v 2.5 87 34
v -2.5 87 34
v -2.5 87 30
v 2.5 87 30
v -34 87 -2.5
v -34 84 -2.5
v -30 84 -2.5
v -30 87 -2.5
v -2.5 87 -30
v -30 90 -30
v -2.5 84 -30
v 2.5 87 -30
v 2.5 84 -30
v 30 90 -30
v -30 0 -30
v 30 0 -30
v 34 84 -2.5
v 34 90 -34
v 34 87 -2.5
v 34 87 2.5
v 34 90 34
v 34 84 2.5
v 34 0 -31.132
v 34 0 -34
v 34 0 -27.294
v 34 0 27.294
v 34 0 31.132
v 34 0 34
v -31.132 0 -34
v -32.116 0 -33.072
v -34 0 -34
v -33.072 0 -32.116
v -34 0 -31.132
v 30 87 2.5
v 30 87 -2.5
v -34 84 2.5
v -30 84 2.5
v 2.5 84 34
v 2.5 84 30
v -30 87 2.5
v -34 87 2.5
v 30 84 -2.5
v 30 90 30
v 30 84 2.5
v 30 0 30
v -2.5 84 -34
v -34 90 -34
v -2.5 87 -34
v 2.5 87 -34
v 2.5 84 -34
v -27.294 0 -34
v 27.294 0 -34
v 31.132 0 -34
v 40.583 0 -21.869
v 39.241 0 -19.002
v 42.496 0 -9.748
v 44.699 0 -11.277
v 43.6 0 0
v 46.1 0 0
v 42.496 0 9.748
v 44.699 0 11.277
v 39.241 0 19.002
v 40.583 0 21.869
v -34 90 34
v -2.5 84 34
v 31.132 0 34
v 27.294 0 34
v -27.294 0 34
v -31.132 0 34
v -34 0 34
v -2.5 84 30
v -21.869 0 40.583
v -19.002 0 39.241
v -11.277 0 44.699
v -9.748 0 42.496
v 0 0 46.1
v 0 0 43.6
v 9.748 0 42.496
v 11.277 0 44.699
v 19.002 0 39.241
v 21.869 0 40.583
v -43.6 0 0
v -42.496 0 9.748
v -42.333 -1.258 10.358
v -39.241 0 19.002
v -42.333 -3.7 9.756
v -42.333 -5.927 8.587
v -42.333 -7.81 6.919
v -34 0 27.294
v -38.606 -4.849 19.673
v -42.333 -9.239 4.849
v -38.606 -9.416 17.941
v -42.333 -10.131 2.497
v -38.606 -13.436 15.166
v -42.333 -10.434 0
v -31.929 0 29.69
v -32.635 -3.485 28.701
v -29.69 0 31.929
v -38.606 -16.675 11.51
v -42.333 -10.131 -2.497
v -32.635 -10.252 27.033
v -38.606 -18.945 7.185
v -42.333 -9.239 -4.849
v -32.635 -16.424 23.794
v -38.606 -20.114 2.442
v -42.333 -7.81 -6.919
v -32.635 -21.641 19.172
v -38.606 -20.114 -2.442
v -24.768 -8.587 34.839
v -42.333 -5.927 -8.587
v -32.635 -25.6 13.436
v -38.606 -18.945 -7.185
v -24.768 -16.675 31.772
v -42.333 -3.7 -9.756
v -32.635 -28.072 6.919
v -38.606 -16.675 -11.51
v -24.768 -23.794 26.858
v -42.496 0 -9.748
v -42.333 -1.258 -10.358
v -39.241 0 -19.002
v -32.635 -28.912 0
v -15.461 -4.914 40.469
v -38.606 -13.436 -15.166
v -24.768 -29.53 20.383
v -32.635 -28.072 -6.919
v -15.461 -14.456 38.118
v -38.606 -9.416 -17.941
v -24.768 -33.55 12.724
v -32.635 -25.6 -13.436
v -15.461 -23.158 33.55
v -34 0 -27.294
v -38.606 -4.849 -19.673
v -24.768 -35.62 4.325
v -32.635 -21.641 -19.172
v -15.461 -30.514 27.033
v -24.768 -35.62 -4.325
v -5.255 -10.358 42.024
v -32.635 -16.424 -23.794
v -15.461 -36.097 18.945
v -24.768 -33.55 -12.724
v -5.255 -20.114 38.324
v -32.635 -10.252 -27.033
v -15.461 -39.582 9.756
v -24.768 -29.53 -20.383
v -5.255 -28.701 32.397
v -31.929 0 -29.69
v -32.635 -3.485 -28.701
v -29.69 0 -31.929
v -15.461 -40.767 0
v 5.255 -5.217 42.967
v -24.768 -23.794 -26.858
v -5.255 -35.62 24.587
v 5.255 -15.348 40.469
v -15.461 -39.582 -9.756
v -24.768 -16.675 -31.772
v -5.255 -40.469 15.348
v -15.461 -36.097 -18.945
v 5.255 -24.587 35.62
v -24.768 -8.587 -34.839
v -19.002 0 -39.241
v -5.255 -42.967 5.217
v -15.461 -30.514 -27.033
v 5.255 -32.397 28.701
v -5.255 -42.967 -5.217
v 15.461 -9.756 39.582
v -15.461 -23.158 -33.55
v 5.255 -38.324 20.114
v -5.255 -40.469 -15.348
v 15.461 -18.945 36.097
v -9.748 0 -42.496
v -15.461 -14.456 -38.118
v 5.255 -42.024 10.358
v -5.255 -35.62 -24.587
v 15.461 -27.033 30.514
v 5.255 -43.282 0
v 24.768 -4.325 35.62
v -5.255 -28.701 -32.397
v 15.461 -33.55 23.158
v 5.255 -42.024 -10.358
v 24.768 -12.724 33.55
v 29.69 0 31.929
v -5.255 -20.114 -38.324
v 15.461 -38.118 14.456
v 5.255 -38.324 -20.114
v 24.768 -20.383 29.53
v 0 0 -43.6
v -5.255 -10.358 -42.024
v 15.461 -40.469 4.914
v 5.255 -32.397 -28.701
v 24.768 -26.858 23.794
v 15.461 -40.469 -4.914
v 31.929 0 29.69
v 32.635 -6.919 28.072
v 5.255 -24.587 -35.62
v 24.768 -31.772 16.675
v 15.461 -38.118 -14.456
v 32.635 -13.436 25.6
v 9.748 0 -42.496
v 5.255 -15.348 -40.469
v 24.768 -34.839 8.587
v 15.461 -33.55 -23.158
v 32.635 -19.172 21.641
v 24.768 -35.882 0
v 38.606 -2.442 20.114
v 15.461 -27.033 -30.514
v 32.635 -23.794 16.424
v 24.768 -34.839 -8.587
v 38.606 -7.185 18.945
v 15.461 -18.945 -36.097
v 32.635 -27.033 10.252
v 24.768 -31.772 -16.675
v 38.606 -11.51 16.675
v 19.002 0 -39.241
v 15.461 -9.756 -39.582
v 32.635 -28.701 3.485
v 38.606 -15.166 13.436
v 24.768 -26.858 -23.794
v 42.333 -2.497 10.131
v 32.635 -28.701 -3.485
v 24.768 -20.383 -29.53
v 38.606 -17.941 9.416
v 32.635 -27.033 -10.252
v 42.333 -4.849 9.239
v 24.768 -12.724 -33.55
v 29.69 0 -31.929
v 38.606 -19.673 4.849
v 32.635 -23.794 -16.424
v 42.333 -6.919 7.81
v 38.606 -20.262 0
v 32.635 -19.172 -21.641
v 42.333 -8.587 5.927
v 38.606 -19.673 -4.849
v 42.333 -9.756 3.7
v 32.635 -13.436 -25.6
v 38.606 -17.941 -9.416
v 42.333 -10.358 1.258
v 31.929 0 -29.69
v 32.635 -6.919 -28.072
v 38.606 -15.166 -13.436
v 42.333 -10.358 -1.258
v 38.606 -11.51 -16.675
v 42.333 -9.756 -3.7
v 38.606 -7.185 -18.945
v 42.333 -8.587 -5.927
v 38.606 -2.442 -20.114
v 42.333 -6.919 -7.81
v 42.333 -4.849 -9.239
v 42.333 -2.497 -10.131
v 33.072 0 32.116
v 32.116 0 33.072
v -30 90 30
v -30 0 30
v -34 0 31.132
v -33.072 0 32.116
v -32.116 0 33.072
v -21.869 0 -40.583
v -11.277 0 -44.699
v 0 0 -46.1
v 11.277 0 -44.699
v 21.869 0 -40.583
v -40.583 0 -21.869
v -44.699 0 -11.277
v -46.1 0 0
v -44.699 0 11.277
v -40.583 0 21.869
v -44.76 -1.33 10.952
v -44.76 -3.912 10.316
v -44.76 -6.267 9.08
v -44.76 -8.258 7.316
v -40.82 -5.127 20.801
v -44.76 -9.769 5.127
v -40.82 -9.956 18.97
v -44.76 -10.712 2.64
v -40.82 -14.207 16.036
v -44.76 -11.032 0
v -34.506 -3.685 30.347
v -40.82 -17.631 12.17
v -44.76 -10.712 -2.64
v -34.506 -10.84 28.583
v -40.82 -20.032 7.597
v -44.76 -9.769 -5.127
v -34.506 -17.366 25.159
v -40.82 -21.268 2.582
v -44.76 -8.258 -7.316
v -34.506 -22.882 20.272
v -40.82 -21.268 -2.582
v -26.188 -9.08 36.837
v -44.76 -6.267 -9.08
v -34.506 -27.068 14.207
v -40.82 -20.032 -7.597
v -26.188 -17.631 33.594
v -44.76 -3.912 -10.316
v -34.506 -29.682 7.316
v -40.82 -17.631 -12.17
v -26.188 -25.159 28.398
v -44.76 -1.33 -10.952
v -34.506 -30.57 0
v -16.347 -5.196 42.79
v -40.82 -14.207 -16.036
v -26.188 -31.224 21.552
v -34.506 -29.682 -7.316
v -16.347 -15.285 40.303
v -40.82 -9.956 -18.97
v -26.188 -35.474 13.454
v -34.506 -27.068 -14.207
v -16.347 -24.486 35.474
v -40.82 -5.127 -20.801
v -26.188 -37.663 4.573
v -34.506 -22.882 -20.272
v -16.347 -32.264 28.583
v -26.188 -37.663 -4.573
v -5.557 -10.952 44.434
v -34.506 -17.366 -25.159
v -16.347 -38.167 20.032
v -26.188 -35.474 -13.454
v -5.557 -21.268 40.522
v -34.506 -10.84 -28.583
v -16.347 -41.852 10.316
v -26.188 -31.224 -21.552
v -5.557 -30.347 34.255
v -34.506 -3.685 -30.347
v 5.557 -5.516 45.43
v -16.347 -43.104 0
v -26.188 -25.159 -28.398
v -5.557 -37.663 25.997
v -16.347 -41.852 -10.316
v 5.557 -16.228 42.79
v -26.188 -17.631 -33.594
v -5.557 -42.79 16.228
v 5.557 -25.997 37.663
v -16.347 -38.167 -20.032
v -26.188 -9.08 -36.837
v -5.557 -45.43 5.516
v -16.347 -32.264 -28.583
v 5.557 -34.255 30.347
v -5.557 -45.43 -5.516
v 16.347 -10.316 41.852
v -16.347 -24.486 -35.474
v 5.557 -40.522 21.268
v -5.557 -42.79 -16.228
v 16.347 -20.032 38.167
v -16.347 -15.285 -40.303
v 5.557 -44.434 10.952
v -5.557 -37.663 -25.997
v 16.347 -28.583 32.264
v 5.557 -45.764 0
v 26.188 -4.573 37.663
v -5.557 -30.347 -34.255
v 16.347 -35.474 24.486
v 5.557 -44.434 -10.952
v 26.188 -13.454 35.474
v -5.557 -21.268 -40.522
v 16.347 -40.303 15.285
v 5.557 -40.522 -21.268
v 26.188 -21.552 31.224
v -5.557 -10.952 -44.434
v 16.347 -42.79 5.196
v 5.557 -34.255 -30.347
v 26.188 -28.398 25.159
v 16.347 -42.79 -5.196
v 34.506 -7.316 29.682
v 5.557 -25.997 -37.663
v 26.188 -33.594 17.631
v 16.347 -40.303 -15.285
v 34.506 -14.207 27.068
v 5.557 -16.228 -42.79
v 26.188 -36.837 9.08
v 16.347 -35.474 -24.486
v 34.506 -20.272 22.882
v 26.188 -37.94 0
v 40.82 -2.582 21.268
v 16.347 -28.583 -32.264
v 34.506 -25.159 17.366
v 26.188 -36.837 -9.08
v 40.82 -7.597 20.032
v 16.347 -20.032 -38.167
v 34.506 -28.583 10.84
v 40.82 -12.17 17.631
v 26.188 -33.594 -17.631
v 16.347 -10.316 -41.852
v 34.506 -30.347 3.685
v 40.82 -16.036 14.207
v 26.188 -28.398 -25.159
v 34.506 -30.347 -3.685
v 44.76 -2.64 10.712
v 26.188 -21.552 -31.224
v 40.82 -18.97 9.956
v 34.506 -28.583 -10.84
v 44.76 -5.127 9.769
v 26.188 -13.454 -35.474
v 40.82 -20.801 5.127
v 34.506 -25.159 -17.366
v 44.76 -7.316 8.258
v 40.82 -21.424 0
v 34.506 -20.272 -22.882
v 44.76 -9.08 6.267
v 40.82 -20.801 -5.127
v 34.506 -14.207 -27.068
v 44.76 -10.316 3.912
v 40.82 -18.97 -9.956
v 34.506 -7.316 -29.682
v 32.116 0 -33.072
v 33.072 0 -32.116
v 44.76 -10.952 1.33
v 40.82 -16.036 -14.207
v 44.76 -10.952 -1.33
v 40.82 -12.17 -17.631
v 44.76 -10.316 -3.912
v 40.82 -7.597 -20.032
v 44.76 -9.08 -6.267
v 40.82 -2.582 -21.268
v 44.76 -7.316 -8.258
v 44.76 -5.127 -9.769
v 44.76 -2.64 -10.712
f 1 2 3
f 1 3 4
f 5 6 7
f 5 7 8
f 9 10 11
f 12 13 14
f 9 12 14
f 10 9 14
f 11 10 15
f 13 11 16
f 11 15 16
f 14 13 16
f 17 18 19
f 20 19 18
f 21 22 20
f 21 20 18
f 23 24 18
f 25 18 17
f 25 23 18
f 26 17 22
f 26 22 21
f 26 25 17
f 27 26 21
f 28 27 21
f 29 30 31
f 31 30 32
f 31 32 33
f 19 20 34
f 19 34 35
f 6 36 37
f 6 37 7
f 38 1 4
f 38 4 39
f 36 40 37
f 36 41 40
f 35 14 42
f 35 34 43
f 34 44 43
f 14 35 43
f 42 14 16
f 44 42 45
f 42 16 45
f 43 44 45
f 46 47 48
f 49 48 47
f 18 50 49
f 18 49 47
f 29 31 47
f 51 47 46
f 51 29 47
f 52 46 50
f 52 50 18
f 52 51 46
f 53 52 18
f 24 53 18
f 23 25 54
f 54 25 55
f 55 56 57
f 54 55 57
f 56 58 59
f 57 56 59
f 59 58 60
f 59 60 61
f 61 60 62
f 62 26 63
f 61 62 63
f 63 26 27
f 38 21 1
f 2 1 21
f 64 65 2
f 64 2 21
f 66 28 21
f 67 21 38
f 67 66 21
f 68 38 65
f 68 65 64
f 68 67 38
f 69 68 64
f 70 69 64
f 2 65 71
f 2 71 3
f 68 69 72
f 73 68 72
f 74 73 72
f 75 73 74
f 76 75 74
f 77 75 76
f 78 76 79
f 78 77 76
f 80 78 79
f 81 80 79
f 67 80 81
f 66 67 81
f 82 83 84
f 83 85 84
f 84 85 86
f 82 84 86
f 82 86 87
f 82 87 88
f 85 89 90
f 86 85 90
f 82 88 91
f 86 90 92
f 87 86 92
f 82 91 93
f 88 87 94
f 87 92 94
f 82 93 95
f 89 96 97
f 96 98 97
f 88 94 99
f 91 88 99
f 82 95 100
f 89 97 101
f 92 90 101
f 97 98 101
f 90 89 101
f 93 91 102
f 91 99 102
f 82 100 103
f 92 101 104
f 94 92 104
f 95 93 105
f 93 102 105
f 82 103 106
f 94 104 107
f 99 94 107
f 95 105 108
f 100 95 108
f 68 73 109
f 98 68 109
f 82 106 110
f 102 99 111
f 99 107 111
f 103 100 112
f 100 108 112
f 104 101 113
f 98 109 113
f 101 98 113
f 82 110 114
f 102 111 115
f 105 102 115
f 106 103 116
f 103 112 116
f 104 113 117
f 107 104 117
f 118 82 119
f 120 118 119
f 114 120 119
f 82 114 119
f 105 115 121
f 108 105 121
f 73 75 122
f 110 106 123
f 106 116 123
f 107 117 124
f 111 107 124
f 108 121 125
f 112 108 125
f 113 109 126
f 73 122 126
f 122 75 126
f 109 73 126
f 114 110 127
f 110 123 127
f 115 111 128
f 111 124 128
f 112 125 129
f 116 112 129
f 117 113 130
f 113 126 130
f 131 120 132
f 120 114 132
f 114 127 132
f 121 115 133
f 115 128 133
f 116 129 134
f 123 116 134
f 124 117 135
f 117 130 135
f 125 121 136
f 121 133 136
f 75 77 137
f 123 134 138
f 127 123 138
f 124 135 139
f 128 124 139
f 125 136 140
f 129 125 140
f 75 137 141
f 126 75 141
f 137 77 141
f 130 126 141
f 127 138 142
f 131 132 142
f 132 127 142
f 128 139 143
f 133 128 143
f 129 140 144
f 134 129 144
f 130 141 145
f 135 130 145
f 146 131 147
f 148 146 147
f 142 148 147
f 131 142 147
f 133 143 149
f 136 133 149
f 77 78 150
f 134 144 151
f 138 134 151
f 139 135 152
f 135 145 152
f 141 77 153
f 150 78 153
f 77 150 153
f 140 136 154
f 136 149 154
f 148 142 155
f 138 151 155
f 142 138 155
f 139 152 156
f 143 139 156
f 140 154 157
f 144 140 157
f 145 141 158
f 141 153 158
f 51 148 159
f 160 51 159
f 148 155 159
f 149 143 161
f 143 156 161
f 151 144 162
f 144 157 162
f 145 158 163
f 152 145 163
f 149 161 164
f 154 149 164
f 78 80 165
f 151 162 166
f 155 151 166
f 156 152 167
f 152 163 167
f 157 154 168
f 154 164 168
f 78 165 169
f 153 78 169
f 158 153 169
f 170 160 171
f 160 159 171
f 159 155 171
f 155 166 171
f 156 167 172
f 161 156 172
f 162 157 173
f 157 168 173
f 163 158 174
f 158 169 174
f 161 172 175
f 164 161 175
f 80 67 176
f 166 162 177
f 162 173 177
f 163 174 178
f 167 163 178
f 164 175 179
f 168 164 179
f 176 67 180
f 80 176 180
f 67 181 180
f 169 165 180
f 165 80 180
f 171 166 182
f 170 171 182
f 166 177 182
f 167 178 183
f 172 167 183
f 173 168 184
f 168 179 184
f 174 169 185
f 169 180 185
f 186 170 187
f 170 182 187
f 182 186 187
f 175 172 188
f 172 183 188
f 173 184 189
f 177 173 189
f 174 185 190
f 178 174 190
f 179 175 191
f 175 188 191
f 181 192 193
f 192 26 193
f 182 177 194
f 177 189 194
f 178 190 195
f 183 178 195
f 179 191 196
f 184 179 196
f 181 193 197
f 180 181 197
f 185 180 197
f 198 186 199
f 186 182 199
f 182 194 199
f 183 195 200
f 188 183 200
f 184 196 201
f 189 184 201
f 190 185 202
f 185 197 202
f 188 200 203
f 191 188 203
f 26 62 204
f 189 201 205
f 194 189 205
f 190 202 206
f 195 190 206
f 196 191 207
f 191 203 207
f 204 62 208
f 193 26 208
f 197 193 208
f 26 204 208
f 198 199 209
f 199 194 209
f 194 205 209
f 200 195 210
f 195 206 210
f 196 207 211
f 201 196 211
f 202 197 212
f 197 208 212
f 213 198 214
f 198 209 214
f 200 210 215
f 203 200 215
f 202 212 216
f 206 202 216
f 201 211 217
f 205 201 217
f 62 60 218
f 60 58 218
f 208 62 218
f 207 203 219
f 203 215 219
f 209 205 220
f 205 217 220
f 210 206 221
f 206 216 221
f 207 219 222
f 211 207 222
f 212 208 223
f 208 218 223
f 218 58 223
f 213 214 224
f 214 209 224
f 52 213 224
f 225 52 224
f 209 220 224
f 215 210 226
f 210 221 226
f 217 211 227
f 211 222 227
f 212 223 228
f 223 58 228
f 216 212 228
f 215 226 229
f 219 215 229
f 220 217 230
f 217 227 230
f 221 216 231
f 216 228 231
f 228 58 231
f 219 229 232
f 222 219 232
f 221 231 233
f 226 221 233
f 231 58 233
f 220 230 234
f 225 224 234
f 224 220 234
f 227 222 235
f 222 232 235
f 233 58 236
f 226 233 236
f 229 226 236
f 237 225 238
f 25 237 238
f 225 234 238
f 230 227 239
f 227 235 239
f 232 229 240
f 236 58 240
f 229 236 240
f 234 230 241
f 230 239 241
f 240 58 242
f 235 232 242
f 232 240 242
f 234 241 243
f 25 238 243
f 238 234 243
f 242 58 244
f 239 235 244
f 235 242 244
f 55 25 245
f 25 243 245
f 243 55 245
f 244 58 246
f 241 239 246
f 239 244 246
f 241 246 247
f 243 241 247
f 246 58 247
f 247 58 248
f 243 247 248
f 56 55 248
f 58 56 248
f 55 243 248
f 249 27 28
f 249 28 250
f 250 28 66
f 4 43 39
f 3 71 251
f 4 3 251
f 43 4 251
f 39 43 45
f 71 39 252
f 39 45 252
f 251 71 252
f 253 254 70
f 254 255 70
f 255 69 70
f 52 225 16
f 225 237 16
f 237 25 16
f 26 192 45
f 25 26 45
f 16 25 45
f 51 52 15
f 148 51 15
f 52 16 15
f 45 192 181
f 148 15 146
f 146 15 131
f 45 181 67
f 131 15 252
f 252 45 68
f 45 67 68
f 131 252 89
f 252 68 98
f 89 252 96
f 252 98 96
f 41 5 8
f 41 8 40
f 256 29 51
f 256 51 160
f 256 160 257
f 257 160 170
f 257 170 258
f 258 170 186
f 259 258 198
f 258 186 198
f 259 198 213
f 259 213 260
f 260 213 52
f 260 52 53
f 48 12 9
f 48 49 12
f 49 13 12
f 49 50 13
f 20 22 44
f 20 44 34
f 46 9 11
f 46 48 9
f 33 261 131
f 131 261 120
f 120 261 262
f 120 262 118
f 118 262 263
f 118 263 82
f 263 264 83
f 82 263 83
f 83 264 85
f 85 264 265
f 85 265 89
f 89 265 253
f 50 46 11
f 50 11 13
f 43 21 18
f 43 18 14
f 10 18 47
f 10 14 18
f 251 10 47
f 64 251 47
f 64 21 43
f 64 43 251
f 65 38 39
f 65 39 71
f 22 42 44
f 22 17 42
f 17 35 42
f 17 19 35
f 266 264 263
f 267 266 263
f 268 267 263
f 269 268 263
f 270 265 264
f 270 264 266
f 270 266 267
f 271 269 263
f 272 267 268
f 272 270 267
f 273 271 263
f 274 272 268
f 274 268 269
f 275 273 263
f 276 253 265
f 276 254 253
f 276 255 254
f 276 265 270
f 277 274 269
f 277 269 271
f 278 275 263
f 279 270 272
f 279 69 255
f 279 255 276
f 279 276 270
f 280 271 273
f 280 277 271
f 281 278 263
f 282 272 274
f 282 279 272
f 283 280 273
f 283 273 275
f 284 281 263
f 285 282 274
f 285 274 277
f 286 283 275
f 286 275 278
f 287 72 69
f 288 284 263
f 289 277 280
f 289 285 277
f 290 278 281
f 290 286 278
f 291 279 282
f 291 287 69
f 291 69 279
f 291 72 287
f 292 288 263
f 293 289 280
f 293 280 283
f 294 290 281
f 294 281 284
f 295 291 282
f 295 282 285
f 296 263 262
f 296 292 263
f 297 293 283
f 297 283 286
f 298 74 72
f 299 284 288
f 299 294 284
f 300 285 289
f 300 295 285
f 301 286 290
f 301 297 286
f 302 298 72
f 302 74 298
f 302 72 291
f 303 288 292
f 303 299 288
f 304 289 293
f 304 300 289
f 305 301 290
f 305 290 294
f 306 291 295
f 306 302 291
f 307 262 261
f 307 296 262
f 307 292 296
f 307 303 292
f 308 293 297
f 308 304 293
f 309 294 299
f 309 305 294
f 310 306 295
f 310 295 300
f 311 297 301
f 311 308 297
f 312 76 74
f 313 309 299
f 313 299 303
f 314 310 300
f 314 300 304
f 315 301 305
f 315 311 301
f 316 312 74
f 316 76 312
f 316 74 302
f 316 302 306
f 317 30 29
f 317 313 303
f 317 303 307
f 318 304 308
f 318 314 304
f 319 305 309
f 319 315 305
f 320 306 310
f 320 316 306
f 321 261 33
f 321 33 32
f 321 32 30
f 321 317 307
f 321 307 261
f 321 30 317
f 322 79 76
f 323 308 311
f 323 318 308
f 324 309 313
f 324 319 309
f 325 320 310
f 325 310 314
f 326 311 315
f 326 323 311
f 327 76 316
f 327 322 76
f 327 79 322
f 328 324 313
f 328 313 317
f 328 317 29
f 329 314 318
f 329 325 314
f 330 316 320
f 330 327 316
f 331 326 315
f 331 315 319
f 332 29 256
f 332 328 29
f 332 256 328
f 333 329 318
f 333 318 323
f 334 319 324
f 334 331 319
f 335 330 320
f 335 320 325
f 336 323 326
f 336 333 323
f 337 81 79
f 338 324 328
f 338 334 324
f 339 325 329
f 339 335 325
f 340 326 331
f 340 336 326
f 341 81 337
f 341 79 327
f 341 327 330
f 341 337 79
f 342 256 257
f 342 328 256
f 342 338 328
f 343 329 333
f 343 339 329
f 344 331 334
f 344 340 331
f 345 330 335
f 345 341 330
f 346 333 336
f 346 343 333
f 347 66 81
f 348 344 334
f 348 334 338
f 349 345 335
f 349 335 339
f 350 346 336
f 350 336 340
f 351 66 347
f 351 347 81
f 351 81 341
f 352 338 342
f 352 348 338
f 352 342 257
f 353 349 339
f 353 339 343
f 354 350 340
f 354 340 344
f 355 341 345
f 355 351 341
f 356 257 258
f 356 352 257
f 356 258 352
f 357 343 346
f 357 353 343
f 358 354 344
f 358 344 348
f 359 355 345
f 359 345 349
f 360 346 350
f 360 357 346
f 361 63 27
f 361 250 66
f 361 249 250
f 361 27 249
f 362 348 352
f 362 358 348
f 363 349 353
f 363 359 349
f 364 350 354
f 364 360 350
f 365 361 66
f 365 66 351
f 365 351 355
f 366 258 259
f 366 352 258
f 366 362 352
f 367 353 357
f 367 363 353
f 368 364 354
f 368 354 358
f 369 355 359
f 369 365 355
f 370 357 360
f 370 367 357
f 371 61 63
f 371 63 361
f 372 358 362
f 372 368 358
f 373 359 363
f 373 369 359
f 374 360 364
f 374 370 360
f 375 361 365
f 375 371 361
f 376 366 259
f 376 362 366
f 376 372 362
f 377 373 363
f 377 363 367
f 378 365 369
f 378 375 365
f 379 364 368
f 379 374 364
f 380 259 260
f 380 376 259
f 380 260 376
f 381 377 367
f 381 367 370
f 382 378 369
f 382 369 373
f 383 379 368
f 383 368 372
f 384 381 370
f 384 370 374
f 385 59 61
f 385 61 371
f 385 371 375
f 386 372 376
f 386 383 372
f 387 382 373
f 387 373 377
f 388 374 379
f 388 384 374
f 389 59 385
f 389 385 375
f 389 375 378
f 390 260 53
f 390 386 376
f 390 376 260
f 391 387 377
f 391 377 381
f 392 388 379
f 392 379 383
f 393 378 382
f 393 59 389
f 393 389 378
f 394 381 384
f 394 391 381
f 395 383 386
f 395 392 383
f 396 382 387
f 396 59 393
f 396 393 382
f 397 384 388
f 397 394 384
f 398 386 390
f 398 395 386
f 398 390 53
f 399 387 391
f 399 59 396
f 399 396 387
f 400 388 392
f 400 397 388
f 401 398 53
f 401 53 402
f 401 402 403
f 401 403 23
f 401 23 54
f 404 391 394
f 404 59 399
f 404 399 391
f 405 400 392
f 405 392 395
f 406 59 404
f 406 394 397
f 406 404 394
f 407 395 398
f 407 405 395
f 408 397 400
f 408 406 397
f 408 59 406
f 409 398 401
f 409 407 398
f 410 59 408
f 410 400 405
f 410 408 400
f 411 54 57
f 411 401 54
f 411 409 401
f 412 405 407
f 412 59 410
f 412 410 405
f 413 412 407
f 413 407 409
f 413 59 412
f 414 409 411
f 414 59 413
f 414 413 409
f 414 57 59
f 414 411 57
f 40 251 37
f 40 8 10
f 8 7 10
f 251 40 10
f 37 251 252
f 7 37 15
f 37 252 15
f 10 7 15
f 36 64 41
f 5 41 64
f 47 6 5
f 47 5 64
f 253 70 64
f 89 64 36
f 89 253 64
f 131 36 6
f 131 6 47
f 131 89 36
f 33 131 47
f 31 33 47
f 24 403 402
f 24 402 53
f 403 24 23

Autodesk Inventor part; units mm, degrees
ref_plane "YZ Plane" through (0, 0, 0) normal (1, 0, 0) x (0, 1, 0)
ref_plane "XZ Plane" through (0, 0, 0) normal (0, 1, 0) x (-1, 0, 0)
ref_plane "XY Plane" through (0, 0, 0) normal (0, 0, 1) x (1, 0, 0)
sketch "Sketch1" plane through (0, 0, 0) normal (0, 1, 0) x (-1, 0, 0)
  line L0 (-30, 30) -> (30, 30)
  line L1 (30, 30) -> (30, -30)
  line L2 (30, -30) -> (-30, -30)
  line L3 (-30, -30) -> (-30, 30)
  line L4 (-30, 30) -> (30, -30) construction
  line L5 (30, 30) -> (-30, -30) construction
  line L6 (-34, 34) -> (34, 34)
  line L7 (34, 34) -> (34, -34)
  line L8 (34, -34) -> (-34, -34)
  line L9 (-34, -34) -> (-34, 34)
  line L10 (-34, 34) -> (34, -34) construction
  line L11 (34, 34) -> (-34, -34) construction
  point P0 (0, 0)
  dimension "d0" = 60
  dimension "d1" = 4
  dimension "d2" = 4
extrude "Extrusion1" add sketch "Sketch1" along normal blind 90
sketch "Sketch2" plane through (34, 0, 34) normal (1, 0, 0) x (0, 0, -1)
  line L0 (31.5, 87) -> (36.5, 87)
  line L1 (36.5, 87) -> (36.5, 84)
  line L2 (36.5, 84) -> (31.5, 84)
  line L3 (31.5, 84) -> (31.5, 87)
  line L4 (31.5, 87) -> (36.5, 84) construction
  line L5 (36.5, 87) -> (31.5, 84) construction
  line L6 (0, 90) -> (68, 90) projected
  point P0 (34, 0)
  point P1 (34, 85.5)
  dimension "d5" = 3
  dimension "d6" = 3
  dimension "d7" = 5
extrude "Extrusion2" cut sketch "Sketch2" against normal up to surface (4 mm away)
pattern_circular "Circular Pattern1" count 4 over 360 about axis through (0, -10, 0) along (0, 1, 0) of "Extrusion2"
sketch "Sketch3" plane through (0, 0, 0) normal (0, -1, 0) x (1, 0, 0)
  arc A0 (-43.6, 0) -> (43.6, 0) centre (0, 0) ccw
  arc A1 (-46.1, 0) -> (46.1, 0) centre (0, 0) ccw
  line L0 (43.6, 0) -> (46.1, 0)
  line L1 (-46.1, 0) -> (-43.6, 0)
  line L2 (0, 0) -> (7.0498, 0) construction
  dimension "d14" = 2.5
  dimension "d17" = 43.6
revolve "Revolution1" add sketch "Sketch3" angle 180 about axis through (0, 0, 0) along (-1, 0, 0)
ref_plane "Work Plane1" through (0, -21, 0) normal (0, -1, 0) x (1, 0, 0)
properties part number "box-v1"
